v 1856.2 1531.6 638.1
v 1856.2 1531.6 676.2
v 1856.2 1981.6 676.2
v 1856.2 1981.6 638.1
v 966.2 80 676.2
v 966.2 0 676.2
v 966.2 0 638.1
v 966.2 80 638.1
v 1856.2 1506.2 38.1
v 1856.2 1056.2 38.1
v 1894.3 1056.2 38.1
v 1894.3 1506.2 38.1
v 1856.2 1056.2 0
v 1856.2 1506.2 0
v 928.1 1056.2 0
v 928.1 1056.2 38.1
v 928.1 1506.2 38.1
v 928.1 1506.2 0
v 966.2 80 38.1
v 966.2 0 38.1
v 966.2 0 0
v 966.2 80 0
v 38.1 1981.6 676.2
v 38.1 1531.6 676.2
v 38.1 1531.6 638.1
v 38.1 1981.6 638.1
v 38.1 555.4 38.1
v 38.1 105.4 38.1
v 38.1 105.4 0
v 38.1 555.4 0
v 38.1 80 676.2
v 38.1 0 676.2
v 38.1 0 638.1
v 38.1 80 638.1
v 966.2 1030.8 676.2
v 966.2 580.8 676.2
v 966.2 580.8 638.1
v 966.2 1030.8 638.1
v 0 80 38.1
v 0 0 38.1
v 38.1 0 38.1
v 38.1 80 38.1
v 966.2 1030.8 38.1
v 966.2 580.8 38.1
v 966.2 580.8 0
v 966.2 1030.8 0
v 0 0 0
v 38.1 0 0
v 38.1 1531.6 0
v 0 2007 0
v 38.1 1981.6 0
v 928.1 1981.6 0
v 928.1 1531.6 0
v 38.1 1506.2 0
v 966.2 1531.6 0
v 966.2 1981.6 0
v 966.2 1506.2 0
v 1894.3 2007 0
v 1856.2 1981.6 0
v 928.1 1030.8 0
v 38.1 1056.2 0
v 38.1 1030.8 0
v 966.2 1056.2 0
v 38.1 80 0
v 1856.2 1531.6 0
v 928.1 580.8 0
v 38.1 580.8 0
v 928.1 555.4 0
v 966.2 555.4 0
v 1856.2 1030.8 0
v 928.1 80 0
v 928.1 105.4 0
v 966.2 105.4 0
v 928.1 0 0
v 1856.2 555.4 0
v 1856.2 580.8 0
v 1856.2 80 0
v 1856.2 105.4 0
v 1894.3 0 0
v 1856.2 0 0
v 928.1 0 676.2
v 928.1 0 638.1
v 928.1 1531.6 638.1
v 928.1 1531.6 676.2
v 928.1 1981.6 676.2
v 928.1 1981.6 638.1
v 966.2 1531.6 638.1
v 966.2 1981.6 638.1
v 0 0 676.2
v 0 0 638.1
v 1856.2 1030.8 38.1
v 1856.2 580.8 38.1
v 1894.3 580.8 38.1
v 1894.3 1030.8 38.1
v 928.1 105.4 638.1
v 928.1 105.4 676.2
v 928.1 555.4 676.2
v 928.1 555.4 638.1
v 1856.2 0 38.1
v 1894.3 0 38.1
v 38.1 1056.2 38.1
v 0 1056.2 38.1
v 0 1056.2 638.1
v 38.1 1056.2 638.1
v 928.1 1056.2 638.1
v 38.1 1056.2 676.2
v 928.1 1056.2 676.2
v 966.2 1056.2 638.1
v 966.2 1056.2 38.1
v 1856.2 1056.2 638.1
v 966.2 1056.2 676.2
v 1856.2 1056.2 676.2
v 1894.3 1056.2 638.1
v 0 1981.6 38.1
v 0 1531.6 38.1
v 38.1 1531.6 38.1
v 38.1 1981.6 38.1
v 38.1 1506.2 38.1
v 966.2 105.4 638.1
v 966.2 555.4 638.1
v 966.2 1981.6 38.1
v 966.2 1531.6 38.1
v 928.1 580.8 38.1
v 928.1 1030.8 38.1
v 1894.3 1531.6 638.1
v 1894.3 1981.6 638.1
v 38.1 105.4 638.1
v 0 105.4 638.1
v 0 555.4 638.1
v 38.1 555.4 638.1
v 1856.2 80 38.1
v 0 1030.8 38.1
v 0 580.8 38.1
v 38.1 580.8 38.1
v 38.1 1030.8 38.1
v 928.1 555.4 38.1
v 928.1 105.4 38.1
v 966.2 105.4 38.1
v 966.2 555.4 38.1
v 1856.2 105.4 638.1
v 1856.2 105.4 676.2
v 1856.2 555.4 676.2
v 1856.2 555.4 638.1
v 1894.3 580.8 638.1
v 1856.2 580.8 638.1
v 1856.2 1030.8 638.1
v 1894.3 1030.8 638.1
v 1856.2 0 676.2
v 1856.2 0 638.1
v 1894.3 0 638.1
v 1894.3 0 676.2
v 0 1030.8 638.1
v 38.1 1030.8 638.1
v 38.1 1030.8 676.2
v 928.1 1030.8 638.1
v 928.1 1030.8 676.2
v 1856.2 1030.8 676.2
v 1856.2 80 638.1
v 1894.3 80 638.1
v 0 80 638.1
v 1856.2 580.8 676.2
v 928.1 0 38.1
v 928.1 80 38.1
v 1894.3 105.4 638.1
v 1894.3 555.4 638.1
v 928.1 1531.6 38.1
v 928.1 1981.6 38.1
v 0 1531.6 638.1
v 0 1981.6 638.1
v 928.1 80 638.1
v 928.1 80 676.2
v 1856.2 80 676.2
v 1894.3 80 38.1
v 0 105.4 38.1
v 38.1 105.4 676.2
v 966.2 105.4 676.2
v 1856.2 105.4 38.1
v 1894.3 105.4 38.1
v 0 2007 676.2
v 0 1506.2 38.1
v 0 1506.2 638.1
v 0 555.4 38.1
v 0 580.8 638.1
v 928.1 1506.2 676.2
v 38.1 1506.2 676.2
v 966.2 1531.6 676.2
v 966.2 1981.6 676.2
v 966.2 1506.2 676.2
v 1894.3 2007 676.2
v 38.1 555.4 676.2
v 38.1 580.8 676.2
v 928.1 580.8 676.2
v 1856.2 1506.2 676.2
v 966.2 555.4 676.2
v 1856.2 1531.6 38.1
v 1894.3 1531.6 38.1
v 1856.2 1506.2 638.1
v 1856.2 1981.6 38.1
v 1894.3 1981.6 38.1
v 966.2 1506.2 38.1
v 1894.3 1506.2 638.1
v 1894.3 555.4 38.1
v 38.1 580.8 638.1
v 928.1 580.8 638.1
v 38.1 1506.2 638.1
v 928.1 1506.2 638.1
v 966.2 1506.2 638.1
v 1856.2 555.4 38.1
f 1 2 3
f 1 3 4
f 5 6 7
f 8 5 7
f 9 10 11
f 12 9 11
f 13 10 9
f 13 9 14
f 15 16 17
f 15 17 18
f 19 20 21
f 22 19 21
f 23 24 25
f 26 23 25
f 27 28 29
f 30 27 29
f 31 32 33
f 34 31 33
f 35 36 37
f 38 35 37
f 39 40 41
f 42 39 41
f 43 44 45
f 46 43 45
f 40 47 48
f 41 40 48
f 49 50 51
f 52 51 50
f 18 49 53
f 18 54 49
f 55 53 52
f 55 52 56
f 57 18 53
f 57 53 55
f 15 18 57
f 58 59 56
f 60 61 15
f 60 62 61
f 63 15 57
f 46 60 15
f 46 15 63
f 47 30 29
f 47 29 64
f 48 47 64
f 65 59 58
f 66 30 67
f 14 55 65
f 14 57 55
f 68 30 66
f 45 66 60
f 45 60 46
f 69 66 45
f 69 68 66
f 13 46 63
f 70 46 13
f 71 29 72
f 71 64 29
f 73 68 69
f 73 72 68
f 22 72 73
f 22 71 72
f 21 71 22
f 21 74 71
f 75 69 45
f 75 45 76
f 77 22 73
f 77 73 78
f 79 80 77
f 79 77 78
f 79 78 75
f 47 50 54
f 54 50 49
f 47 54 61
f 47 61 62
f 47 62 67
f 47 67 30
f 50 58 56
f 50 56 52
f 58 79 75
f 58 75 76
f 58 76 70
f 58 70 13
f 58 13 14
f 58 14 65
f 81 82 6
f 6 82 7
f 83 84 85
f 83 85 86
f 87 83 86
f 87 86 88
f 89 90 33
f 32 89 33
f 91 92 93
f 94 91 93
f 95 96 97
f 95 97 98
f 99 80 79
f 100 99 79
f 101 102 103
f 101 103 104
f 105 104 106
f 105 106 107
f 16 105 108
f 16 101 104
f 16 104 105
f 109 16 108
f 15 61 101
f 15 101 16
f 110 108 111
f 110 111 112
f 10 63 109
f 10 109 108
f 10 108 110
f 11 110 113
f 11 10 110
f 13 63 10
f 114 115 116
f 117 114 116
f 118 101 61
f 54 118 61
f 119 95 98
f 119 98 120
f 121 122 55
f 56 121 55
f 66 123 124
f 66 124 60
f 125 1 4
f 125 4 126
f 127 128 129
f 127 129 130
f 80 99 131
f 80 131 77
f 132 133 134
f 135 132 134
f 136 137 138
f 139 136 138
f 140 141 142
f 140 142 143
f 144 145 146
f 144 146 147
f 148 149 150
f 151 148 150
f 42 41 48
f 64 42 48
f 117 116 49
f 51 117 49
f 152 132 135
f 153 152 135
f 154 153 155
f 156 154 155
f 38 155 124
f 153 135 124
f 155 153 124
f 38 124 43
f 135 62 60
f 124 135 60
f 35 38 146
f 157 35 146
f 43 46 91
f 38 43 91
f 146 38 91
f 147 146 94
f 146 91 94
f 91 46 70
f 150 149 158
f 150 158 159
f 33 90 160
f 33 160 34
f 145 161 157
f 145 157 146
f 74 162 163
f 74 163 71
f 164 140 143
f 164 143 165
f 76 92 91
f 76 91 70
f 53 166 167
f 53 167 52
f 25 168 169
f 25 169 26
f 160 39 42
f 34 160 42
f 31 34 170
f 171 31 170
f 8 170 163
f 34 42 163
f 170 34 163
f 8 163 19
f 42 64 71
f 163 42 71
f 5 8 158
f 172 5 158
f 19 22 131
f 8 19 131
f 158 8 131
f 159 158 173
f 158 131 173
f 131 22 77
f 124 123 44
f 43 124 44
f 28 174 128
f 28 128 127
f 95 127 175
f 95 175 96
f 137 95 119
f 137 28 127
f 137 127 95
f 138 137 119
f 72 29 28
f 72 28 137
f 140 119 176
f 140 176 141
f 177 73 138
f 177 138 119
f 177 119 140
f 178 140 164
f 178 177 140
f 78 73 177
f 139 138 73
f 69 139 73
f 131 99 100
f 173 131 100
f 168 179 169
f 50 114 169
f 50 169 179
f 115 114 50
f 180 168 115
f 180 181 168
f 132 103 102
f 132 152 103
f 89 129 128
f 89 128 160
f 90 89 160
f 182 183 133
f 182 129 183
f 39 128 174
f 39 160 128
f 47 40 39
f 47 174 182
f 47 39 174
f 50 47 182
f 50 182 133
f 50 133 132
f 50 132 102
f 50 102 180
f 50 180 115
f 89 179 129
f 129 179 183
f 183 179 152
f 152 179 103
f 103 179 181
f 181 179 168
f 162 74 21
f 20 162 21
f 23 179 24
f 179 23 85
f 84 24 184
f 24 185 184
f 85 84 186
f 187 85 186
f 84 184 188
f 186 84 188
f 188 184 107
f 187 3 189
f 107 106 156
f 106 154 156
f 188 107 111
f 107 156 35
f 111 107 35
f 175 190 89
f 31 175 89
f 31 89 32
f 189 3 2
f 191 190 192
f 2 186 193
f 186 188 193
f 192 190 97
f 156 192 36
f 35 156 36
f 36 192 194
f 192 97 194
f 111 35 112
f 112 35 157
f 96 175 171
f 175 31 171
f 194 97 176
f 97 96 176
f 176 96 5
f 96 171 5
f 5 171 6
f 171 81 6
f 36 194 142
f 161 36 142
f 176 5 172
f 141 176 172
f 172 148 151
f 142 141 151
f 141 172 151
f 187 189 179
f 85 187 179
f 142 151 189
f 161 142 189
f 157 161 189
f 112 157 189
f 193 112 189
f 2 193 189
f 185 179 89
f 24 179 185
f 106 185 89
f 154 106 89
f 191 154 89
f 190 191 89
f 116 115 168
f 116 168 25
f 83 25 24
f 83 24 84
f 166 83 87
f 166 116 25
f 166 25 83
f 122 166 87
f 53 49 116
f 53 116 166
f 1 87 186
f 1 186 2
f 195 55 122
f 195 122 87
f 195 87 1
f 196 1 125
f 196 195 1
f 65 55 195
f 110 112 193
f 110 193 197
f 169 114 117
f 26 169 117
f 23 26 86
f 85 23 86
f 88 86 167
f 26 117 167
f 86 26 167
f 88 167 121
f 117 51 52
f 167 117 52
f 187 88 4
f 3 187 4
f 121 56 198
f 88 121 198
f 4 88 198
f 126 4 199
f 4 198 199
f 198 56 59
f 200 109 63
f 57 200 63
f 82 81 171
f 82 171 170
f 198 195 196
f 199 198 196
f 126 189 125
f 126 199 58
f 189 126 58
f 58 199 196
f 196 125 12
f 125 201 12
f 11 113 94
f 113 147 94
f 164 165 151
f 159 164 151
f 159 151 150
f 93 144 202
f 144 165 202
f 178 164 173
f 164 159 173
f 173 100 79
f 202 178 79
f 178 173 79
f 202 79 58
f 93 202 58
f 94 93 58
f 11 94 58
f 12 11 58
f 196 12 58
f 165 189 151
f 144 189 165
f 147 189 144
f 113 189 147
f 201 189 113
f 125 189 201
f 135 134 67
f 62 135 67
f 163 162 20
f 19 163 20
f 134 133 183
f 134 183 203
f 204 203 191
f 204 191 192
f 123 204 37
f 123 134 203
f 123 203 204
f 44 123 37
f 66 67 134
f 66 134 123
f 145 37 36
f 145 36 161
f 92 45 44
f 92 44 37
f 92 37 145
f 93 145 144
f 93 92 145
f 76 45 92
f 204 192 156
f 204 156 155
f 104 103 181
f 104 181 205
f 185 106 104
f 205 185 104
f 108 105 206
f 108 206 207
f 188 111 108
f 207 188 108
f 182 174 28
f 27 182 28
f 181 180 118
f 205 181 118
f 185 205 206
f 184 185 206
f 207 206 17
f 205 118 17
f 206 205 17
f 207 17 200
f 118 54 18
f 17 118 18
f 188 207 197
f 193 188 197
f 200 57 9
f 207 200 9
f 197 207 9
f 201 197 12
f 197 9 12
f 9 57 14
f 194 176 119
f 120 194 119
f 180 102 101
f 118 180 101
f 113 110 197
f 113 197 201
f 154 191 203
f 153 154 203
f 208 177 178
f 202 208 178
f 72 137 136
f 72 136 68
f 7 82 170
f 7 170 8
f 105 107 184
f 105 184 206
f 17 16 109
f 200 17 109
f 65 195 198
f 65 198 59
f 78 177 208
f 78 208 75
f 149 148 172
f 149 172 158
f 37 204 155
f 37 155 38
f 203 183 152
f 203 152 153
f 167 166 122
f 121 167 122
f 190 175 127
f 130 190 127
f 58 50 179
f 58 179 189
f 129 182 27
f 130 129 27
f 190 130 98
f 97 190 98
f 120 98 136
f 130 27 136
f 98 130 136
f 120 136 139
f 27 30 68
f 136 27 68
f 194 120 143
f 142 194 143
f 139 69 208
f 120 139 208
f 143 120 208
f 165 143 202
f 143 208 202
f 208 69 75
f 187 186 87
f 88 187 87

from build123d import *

# Parameters (mm, degrees)
CROQUIS1_W                = 38.1
CROQUIS1_H                = 38.1
SALIENTE_EXTRUIR1_DEPTH   = 80
SALIENTE_EXTRUIR1_2_DEPTH = 80
SALIENTE_EXTRUIR1_3_DEPTH = 80
SALIENTE_EXTRUIR1_4_DEPTH = 80
SALIENTE_EXTRUIR1_5_DEPTH = 80
SALIENTE_EXTRUIR1_6_DEPTH = 80
CROQUIS2_W                = 1894.3
CROQUIS2_H                = 676.2
SALIENTE_EXTRUIR2_DEPTH   = 25.4
CROQUIS3_W                = 38.1
CROQUIS3_H                = 38.1
SALIENTE_EXTRUIR3_DEPTH   = 450
CROQUIS4_W                = 1894.3
CROQUIS4_H                = 676.2
SALIENTE_EXTRUIR4_DEPTH   = 25.4
CROQUIS5_W                = 38.1
CROQUIS5_H                = 38.1
SALIENTE_EXTRUIR5_DEPTH   = 450
CROQUIS6_W                = 1894.3
CROQUIS6_H                = 676.2
SALIENTE_EXTRUIR6_DEPTH   = 25.4
CROQUIS7_W                = 38.1
CROQUIS7_H                = 38.1
SALIENTE_EXTRUIR7_DEPTH   = 450
CROQUIS8_W                = 1894.3
CROQUIS8_H                = 676.2
SALIENTE_EXTRUIR8_DEPTH   = 25.4
CROQUIS9_W                = 38.1
CROQUIS9_H                = 38.1
SALIENTE_EXTRUIR9_DEPTH   = 450
CROQUIS10_W               = 1894.3
CROQUIS10_H               = 676.2
SALIENTE_EXTRUIR10_DEPTH  = 25.4


with BuildPart() as part:
    # Croquis1 → Saliente-Extruir1 (new body)
    with BuildSketch(Plane(origin=(0, 0, 0), x_dir=(1, 0, 0), z_dir=(0, 1, 0))):
        with Locations((19.05, -19.05)):
            Rectangle(CROQUIS1_W, CROQUIS1_H)
    extrude(amount=SALIENTE_EXTRUIR1_DEPTH)



with BuildPart() as body_2:
    # Croquis1 → Saliente-Extruir1 2 (new body)
    with BuildSketch(Plane(origin=(0, 0, 0), x_dir=(1, 0, 0), z_dir=(0, 1, 0))):
        with Locations((947.15, -19.05)):
            Rectangle(CROQUIS1_W, CROQUIS1_H)
    extrude(amount=SALIENTE_EXTRUIR1_2_DEPTH)


with BuildPart() as body_3:
    # Croquis1 → Saliente-Extruir1 3 (new body)
    with BuildSketch(Plane(origin=(0, 0, 0), x_dir=(1, 0, 0), z_dir=(0, 1, 0))):
        with Locations((1875.25, -19.05)):
            Rectangle(CROQUIS1_W, CROQUIS1_H)
    extrude(amount=SALIENTE_EXTRUIR1_3_DEPTH)


with BuildPart() as body_4:
    # Croquis1 → Saliente-Extruir1 4 (new body)
    with BuildSketch(Plane(origin=(0, 0, 0), x_dir=(1, 0, 0), z_dir=(0, 1, 0))):
        with Locations((1875.25, -657.15)):
            Rectangle(CROQUIS1_W, CROQUIS1_H)
    extrude(amount=SALIENTE_EXTRUIR1_4_DEPTH)


with BuildPart() as body_5:
    # Croquis1 → Saliente-Extruir1 5 (new body)
    with BuildSketch(Plane(origin=(0, 0, 0), x_dir=(1, 0, 0), z_dir=(0, 1, 0))):
        with Locations((947.15, -657.15)):
            Rectangle(CROQUIS1_W, CROQUIS1_H)
    extrude(amount=SALIENTE_EXTRUIR1_5_DEPTH)


with BuildPart() as body_6:
    # Croquis1 → Saliente-Extruir1 6 (new body)
    with BuildSketch(Plane(origin=(0, 0, 0), x_dir=(1, 0, 0), z_dir=(0, 1, 0))):
        with Locations((19.05, -657.15)):
            Rectangle(CROQUIS1_W, CROQUIS1_H)
    extrude(amount=SALIENTE_EXTRUIR1_6_DEPTH)


with BuildPart() as part_1:
    add(part.part)

    add(body_2.part)  # Saliente-Extruir2 merges body 2

    add(body_3.part)  # Saliente-Extruir2 merges body 3

    add(body_4.part)  # Saliente-Extruir2 merges body 4

    add(body_5.part)  # Saliente-Extruir2 merges body 5

    add(body_6.part)  # Saliente-Extruir2 merges body 6
    # Croquis2 → Saliente-Extruir2 (add)
    with BuildSketch(Plane(origin=(0, 80, 0), x_dir=(1, 0, 0), z_dir=(0, 1, 0))):
        with Locations((947.15, -338.1)):
            Rectangle(CROQUIS2_W, CROQUIS2_H)
    extrude(amount=SALIENTE_EXTRUIR2_DEPTH)

    # Croquis3 → Saliente-Extruir3 (add)
    with BuildSketch(Plane(origin=(0, 105.4, 0), x_dir=(1, 0, 0), z_dir=(0, 1, 0))):
        with Locations((19.05, -19.05)):
            Rectangle(CROQUIS3_W, CROQUIS3_H)
        with Locations((947.15, -19.05)):
            Rectangle(CROQUIS3_W, CROQUIS3_H)
        with Locations((1875.25, -19.05)):
            Rectangle(CROQUIS3_W, CROQUIS3_H)
        with Locations((1875.25, -657.15)):
            Rectangle(CROQUIS3_W, CROQUIS3_H)
        with Locations((947.15, -657.15)):
            Rectangle(CROQUIS3_W, CROQUIS3_H)
        with Locations((19.05, -657.15)):
            Rectangle(CROQUIS3_W, CROQUIS3_H)
    extrude(amount=SALIENTE_EXTRUIR3_DEPTH)

    # Croquis4 → Saliente-Extruir4 (add)
    with BuildSketch(Plane(origin=(0, 555.4, 0), x_dir=(1, 0, 0), z_dir=(0, 1, 0))):
        with Locations((947.15, -338.1)):
            Rectangle(CROQUIS4_W, CROQUIS4_H)
    extrude(amount=SALIENTE_EXTRUIR4_DEPTH)

    # Croquis5 → Saliente-Extruir5 (add)
    with BuildSketch(Plane(origin=(0, 580.8, 0), x_dir=(1, 0, 0), z_dir=(0, 1, 0))):
        with Locations((19.05, -19.05)):
            Rectangle(CROQUIS5_W, CROQUIS5_H)
        with Locations((947.15, -19.05)):
            Rectangle(CROQUIS5_W, CROQUIS5_H)
        with Locations((1875.25, -19.05)):
            Rectangle(CROQUIS5_W, CROQUIS5_H)
        with Locations((1875.25, -657.15)):
            Rectangle(CROQUIS5_W, CROQUIS5_H)
        with Locations((947.15, -657.15)):
            Rectangle(CROQUIS5_W, CROQUIS5_H)
        with Locations((19.05, -657.15)):
            Rectangle(CROQUIS5_W, CROQUIS5_H)
    extrude(amount=SALIENTE_EXTRUIR5_DEPTH)

    # Croquis6 → Saliente-Extruir6 (add)
    with BuildSketch(Plane(origin=(0, 1030.8, 0), x_dir=(1, 0, 0), z_dir=(0, 1, 0))):
        with Locations((947.15, -338.1)):
            Rectangle(CROQUIS6_W, CROQUIS6_H)
    extrude(amount=SALIENTE_EXTRUIR6_DEPTH)

    # Croquis7 → Saliente-Extruir7 (add)
    with BuildSketch(Plane(origin=(0, 1056.2, 0), x_dir=(1, 0, 0), z_dir=(0, 1, 0))):
        with Locations((19.05, -19.05)):
            Rectangle(CROQUIS7_W, CROQUIS7_H)
        with Locations((947.15, -19.05)):
            Rectangle(CROQUIS7_W, CROQUIS7_H)
        with Locations((1875.25, -19.05)):
            Rectangle(CROQUIS7_W, CROQUIS7_H)
        with Locations((1875.25, -657.15)):
            Rectangle(CROQUIS7_W, CROQUIS7_H)
        with Locations((947.15, -657.15)):
            Rectangle(CROQUIS7_W, CROQUIS7_H)
        with Locations((19.05, -657.15)):
            Rectangle(CROQUIS7_W, CROQUIS7_H)
    extrude(amount=SALIENTE_EXTRUIR7_DEPTH)

    # Croquis8 → Saliente-Extruir8 (add)
    with BuildSketch(Plane(origin=(0, 1506.2, 0), x_dir=(1, 0, 0), z_dir=(0, 1, 0))):
        with Locations((947.15, -338.1)):
            Rectangle(CROQUIS8_W, CROQUIS8_H)
    extrude(amount=SALIENTE_EXTRUIR8_DEPTH)

    # Croquis9 → Saliente-Extruir9 (add)
    with BuildSketch(Plane(origin=(0, 1531.6, 0), x_dir=(1, 0, 0), z_dir=(0, 1, 0))):
        with Locations((19.05, -19.05)):
            Rectangle(CROQUIS9_W, CROQUIS9_H)
        with Locations((947.15, -19.05)):
            Rectangle(CROQUIS9_W, CROQUIS9_H)
        with Locations((1875.25, -19.05)):
            Rectangle(CROQUIS9_W, CROQUIS9_H)
        with Locations((1875.25, -657.15)):
            Rectangle(CROQUIS9_W, CROQUIS9_H)
        with Locations((947.15, -657.15)):
            Rectangle(CROQUIS9_W, CROQUIS9_H)
        with Locations((19.05, -657.15)):
            Rectangle(CROQUIS9_W, CROQUIS9_H)
    extrude(amount=SALIENTE_EXTRUIR9_DEPTH)

    # Croquis10 → Saliente-Extruir10 (add)
    with BuildSketch(Plane(origin=(0, 1981.6, 0), x_dir=(1, 0, 0), z_dir=(0, 1, 0))):
        with Locations((947.15, -338.1)):
            Rectangle(CROQUIS10_W, CROQUIS10_H)
    extrude(amount=SALIENTE_EXTRUIR10_DEPTH)


solid = part_1.part
